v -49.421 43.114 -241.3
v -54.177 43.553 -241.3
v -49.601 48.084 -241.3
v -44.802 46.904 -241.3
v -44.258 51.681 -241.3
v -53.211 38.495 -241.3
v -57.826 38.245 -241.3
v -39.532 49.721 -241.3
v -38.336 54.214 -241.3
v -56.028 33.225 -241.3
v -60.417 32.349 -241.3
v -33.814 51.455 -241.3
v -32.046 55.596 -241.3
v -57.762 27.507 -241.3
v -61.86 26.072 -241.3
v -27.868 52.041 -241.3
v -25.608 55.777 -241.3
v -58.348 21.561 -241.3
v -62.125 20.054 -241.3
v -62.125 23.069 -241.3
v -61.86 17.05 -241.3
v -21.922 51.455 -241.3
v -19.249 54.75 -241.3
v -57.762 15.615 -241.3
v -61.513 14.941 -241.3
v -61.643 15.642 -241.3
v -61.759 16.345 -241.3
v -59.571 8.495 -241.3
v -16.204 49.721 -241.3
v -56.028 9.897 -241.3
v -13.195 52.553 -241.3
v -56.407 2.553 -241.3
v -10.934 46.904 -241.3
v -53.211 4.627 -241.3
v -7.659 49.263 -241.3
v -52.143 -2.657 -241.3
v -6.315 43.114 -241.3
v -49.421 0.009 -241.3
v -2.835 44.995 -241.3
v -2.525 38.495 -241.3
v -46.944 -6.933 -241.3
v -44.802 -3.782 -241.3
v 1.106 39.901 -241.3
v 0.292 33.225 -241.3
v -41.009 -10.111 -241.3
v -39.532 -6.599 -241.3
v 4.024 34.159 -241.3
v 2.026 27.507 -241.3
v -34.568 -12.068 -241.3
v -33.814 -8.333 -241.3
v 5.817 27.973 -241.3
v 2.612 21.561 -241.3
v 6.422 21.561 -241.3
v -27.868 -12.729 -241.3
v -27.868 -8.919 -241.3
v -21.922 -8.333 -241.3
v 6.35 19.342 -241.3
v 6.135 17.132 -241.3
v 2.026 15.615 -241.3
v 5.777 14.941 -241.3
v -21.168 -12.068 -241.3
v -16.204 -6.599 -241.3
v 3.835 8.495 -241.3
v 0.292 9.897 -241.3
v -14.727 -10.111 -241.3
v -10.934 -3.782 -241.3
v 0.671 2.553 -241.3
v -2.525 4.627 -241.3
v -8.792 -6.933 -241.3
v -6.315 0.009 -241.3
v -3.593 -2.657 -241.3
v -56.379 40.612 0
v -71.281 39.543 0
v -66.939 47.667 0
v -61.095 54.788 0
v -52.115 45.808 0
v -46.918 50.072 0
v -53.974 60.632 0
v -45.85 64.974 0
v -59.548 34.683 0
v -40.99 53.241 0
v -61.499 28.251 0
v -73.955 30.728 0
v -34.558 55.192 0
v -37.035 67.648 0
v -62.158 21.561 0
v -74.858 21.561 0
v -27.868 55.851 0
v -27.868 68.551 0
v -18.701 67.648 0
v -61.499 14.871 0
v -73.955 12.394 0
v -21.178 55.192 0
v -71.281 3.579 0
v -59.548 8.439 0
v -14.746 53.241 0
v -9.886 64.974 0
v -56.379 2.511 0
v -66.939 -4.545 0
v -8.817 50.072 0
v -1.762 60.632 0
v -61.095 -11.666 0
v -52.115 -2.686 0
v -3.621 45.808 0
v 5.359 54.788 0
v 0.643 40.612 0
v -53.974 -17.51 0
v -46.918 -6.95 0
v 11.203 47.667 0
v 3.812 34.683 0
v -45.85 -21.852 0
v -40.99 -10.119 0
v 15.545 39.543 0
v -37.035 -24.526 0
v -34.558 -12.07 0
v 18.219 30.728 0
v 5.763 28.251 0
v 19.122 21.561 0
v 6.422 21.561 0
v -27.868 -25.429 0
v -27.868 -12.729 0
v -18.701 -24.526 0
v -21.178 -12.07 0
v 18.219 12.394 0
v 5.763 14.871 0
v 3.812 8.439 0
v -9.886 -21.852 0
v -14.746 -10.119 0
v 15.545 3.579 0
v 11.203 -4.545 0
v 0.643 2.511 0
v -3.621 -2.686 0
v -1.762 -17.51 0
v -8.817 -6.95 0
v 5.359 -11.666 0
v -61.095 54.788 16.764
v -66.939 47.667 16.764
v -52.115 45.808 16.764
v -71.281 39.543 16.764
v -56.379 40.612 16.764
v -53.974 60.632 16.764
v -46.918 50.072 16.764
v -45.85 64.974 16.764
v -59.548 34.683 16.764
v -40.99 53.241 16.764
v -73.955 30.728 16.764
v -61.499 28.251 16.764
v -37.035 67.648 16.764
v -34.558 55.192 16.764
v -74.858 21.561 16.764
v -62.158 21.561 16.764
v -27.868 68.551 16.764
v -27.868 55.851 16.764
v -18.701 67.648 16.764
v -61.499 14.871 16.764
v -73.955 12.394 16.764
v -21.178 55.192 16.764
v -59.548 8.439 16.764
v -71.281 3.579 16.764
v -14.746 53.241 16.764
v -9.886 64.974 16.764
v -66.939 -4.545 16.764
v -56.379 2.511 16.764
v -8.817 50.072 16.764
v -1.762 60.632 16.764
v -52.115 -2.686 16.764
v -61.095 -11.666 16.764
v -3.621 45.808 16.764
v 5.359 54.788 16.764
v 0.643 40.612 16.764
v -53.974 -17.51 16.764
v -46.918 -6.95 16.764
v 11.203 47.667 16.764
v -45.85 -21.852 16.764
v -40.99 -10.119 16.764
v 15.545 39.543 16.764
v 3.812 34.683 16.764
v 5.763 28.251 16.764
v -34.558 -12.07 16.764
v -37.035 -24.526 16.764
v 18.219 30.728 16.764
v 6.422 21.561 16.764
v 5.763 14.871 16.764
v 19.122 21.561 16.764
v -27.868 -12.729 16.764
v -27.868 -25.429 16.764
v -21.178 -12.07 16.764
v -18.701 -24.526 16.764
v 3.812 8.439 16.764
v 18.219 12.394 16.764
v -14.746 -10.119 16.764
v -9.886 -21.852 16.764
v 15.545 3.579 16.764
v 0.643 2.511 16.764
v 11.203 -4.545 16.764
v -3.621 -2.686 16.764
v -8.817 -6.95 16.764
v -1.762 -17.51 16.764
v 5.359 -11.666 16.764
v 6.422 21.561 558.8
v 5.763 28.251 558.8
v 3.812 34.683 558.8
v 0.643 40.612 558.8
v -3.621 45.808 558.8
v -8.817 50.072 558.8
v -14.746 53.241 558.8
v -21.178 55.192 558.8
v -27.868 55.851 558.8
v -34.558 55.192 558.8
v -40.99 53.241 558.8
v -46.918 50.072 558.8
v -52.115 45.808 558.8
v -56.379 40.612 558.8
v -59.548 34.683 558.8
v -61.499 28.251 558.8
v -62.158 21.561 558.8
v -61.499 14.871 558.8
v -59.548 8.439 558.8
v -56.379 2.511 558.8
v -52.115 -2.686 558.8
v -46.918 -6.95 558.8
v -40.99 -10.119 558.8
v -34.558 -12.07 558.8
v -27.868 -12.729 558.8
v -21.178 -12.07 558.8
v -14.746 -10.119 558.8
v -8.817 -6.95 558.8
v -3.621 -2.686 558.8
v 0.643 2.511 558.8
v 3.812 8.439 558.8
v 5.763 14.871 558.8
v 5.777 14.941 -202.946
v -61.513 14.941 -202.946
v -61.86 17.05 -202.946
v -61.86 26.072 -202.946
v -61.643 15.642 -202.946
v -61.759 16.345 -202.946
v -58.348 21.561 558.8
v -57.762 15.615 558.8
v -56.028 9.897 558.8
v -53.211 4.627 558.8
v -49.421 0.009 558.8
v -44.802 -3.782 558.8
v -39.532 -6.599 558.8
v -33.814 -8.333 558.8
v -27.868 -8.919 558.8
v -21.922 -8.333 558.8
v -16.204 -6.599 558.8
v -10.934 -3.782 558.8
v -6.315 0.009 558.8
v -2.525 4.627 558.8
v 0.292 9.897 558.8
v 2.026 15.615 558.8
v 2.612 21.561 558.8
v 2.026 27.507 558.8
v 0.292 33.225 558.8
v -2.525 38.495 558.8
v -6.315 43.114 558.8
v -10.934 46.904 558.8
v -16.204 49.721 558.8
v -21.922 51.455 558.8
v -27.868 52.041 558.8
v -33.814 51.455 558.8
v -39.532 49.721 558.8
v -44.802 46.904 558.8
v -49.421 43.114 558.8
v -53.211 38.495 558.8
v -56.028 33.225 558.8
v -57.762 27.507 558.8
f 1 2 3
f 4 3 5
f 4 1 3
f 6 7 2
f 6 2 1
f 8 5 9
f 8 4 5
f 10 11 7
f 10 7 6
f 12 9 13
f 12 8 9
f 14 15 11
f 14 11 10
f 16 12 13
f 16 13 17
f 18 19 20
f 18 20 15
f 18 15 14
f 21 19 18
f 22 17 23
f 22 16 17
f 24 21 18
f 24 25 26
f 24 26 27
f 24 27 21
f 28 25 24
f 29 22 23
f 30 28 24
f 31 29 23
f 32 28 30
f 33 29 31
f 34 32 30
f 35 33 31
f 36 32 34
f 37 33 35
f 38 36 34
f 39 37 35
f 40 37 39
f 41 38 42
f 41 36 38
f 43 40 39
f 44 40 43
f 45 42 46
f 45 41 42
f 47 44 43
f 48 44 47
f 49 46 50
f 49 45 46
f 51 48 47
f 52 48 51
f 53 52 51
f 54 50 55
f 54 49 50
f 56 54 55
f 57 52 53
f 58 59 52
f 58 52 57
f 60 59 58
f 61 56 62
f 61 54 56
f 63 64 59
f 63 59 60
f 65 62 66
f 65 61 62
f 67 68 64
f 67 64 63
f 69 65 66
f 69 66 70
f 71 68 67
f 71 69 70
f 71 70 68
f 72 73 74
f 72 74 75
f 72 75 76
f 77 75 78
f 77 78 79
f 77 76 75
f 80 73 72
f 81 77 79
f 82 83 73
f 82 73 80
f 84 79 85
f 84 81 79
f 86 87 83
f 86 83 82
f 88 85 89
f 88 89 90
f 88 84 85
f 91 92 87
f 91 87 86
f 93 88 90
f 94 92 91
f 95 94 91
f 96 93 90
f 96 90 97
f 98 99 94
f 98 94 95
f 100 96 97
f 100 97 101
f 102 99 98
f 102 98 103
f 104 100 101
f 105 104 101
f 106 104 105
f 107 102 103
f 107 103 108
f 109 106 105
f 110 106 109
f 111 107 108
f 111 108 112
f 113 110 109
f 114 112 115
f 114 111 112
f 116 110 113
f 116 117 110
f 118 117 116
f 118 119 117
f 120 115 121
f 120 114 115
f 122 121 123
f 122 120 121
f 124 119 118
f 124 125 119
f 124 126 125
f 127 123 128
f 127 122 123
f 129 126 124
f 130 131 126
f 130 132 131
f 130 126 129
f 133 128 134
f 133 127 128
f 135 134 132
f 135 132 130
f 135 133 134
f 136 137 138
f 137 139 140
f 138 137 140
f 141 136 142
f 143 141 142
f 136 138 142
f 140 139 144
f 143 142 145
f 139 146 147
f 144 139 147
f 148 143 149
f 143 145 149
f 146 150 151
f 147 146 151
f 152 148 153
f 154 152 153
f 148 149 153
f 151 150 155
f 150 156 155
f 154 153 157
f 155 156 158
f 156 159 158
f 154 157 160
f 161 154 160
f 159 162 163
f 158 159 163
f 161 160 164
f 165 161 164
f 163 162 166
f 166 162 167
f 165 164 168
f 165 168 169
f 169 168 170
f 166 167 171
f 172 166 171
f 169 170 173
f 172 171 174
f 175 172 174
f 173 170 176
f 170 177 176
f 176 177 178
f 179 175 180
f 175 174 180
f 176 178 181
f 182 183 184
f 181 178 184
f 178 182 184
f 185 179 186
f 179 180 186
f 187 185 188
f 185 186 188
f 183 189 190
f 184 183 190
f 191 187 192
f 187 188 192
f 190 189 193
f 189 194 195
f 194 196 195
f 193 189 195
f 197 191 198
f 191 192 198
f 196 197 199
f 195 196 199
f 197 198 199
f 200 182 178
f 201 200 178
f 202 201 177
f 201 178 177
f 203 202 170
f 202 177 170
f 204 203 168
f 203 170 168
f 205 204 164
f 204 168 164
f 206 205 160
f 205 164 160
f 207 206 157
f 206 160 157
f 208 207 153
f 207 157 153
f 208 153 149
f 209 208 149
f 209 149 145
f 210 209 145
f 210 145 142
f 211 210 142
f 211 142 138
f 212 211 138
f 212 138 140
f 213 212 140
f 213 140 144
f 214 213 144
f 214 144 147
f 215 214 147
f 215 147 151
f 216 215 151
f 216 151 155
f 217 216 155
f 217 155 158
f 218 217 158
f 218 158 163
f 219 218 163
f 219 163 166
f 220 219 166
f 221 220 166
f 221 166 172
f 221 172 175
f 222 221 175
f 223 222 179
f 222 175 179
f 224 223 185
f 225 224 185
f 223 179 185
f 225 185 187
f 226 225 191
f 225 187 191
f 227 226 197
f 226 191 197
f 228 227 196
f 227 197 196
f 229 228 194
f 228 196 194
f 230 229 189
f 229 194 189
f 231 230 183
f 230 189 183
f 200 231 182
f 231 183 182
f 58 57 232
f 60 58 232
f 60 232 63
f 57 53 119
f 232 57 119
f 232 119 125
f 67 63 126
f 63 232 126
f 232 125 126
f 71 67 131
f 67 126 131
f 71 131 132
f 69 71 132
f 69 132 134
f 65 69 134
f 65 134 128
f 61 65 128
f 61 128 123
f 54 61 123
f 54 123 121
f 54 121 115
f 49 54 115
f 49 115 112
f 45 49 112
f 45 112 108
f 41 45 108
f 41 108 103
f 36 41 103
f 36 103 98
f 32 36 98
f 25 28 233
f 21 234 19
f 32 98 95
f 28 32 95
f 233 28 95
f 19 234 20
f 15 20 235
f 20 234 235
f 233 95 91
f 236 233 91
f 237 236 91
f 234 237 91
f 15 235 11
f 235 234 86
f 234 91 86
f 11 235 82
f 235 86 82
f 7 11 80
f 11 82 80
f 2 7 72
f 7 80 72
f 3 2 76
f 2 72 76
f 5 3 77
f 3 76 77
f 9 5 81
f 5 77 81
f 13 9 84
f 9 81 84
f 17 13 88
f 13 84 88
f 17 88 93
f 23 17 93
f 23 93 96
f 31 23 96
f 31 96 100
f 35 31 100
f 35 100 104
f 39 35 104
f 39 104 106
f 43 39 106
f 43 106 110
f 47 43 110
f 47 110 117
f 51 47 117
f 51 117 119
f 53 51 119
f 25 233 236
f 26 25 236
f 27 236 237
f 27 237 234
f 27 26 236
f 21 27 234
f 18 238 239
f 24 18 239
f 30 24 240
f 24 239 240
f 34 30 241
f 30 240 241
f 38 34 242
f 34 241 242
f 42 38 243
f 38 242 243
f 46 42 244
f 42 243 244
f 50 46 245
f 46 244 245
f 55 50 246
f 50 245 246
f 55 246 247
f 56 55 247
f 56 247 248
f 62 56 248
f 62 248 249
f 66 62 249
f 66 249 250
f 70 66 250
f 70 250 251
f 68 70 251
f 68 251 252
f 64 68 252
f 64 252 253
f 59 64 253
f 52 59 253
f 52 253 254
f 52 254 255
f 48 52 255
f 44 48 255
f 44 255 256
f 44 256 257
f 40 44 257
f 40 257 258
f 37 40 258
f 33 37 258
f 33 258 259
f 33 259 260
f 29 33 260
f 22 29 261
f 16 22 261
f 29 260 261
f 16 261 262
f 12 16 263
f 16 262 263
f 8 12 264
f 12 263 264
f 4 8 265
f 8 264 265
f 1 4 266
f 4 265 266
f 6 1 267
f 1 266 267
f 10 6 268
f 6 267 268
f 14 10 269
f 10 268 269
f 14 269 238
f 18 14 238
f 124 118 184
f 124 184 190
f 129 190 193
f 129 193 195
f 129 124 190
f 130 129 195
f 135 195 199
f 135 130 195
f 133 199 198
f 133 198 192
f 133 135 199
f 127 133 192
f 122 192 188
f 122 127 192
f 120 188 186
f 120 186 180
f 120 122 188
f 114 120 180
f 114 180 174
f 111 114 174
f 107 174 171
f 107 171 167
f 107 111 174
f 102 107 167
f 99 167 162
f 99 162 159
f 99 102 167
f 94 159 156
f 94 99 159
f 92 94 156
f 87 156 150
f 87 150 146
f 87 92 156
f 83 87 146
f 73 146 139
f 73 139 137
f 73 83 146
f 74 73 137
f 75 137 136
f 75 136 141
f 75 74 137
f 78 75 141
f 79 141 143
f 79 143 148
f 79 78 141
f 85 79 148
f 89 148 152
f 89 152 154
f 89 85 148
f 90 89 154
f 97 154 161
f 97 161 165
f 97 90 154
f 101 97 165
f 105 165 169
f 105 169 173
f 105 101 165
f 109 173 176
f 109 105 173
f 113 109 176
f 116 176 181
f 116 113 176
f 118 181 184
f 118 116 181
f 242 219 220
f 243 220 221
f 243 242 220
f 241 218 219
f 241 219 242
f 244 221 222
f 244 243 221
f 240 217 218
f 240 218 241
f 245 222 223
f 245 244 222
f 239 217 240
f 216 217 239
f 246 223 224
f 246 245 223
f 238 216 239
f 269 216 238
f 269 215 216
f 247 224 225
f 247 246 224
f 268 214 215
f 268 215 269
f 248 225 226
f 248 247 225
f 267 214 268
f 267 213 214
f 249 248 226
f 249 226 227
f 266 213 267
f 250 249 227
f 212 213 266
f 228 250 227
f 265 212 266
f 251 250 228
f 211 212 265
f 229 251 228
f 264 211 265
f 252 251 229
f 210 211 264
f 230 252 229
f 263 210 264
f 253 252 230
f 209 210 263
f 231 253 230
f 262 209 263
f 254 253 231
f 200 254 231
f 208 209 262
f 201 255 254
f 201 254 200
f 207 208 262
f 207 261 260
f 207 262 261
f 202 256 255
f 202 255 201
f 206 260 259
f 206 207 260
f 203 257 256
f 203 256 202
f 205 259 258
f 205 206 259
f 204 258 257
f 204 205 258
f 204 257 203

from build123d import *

# Parameters (mm, degrees)
F0_R     = 34.29
F1_DEPTH = 558.8
F2_R     = 46.99
F2_R_2   = 34.29
F3_DEPTH = 16.764
F4_R     = 34.29
F5_DEPTH = 241.3
F7_DEPTH = 38.354
F9_D     = 60.96


with BuildPart() as f1:
    # F0 (on Top) → F1 (new body)
    with BuildSketch(Plane.XY):
        with Locations((-27.8679728508, 21.5611346066)):
            Circle(F0_R)
    extrude(amount=F1_DEPTH)

    # F2 (on face) → F3 (join)
    with BuildSketch(Plane(origin=(0, 0, 0), x_dir=(1, 0, 0), z_dir=(0, 0, -1))):
        with Locations((-27.8679728508, -21.5611346066)):
            Circle(F2_R)
        with Locations((-27.8679728508, -21.5611346066)):
            Circle(F2_R_2, mode=Mode.SUBTRACT)
    extrude(amount=-F3_DEPTH)

    # F4 (on face) → F5 (join)
    with BuildSketch(Plane(origin=(0, 0, 0), x_dir=(1, 0, 0), z_dir=(0, 0, -1))):
        with Locations((-27.8679728508, -21.5611346066)):
            Circle(F4_R)
    extrude(amount=F5_DEPTH)

    # F6 (on face) → F7 (join)
    with BuildSketch(Plane(origin=(0, 0, -241.3), x_dir=(1, 0, 0), z_dir=(0, 0, -1))):
        with BuildLine():
            Line((5.7768958027, -26.0717726025), (5.7768958027, -14.9409447837))
            Line((5.7768958027, -14.9409447837), (-61.5128415043, -14.9409447837))
            ThreePointArc((-61.5128415043, -14.9409447837), (-61.702868113, -15.9930144037), (-61.86000493, -17.0504966107))
            Line((-61.86000493, -17.0504966107), (-61.86000493, -26.0717726025))
            Line((-61.86000493, -26.0717726025), (5.7768958027, -26.0717726025))
        make_face()
    extrude(amount=-F7_DEPTH)

    # F9 (through all)
    with Locations(Plane(origin=(0, 0, -241.3), x_dir=(1, 0, 0), z_dir=(0, 0, -1))):
        with Locations((-27.8679728508, -21.5611346066)):
            Hole(F9_D / 2)


solid = f1.part
